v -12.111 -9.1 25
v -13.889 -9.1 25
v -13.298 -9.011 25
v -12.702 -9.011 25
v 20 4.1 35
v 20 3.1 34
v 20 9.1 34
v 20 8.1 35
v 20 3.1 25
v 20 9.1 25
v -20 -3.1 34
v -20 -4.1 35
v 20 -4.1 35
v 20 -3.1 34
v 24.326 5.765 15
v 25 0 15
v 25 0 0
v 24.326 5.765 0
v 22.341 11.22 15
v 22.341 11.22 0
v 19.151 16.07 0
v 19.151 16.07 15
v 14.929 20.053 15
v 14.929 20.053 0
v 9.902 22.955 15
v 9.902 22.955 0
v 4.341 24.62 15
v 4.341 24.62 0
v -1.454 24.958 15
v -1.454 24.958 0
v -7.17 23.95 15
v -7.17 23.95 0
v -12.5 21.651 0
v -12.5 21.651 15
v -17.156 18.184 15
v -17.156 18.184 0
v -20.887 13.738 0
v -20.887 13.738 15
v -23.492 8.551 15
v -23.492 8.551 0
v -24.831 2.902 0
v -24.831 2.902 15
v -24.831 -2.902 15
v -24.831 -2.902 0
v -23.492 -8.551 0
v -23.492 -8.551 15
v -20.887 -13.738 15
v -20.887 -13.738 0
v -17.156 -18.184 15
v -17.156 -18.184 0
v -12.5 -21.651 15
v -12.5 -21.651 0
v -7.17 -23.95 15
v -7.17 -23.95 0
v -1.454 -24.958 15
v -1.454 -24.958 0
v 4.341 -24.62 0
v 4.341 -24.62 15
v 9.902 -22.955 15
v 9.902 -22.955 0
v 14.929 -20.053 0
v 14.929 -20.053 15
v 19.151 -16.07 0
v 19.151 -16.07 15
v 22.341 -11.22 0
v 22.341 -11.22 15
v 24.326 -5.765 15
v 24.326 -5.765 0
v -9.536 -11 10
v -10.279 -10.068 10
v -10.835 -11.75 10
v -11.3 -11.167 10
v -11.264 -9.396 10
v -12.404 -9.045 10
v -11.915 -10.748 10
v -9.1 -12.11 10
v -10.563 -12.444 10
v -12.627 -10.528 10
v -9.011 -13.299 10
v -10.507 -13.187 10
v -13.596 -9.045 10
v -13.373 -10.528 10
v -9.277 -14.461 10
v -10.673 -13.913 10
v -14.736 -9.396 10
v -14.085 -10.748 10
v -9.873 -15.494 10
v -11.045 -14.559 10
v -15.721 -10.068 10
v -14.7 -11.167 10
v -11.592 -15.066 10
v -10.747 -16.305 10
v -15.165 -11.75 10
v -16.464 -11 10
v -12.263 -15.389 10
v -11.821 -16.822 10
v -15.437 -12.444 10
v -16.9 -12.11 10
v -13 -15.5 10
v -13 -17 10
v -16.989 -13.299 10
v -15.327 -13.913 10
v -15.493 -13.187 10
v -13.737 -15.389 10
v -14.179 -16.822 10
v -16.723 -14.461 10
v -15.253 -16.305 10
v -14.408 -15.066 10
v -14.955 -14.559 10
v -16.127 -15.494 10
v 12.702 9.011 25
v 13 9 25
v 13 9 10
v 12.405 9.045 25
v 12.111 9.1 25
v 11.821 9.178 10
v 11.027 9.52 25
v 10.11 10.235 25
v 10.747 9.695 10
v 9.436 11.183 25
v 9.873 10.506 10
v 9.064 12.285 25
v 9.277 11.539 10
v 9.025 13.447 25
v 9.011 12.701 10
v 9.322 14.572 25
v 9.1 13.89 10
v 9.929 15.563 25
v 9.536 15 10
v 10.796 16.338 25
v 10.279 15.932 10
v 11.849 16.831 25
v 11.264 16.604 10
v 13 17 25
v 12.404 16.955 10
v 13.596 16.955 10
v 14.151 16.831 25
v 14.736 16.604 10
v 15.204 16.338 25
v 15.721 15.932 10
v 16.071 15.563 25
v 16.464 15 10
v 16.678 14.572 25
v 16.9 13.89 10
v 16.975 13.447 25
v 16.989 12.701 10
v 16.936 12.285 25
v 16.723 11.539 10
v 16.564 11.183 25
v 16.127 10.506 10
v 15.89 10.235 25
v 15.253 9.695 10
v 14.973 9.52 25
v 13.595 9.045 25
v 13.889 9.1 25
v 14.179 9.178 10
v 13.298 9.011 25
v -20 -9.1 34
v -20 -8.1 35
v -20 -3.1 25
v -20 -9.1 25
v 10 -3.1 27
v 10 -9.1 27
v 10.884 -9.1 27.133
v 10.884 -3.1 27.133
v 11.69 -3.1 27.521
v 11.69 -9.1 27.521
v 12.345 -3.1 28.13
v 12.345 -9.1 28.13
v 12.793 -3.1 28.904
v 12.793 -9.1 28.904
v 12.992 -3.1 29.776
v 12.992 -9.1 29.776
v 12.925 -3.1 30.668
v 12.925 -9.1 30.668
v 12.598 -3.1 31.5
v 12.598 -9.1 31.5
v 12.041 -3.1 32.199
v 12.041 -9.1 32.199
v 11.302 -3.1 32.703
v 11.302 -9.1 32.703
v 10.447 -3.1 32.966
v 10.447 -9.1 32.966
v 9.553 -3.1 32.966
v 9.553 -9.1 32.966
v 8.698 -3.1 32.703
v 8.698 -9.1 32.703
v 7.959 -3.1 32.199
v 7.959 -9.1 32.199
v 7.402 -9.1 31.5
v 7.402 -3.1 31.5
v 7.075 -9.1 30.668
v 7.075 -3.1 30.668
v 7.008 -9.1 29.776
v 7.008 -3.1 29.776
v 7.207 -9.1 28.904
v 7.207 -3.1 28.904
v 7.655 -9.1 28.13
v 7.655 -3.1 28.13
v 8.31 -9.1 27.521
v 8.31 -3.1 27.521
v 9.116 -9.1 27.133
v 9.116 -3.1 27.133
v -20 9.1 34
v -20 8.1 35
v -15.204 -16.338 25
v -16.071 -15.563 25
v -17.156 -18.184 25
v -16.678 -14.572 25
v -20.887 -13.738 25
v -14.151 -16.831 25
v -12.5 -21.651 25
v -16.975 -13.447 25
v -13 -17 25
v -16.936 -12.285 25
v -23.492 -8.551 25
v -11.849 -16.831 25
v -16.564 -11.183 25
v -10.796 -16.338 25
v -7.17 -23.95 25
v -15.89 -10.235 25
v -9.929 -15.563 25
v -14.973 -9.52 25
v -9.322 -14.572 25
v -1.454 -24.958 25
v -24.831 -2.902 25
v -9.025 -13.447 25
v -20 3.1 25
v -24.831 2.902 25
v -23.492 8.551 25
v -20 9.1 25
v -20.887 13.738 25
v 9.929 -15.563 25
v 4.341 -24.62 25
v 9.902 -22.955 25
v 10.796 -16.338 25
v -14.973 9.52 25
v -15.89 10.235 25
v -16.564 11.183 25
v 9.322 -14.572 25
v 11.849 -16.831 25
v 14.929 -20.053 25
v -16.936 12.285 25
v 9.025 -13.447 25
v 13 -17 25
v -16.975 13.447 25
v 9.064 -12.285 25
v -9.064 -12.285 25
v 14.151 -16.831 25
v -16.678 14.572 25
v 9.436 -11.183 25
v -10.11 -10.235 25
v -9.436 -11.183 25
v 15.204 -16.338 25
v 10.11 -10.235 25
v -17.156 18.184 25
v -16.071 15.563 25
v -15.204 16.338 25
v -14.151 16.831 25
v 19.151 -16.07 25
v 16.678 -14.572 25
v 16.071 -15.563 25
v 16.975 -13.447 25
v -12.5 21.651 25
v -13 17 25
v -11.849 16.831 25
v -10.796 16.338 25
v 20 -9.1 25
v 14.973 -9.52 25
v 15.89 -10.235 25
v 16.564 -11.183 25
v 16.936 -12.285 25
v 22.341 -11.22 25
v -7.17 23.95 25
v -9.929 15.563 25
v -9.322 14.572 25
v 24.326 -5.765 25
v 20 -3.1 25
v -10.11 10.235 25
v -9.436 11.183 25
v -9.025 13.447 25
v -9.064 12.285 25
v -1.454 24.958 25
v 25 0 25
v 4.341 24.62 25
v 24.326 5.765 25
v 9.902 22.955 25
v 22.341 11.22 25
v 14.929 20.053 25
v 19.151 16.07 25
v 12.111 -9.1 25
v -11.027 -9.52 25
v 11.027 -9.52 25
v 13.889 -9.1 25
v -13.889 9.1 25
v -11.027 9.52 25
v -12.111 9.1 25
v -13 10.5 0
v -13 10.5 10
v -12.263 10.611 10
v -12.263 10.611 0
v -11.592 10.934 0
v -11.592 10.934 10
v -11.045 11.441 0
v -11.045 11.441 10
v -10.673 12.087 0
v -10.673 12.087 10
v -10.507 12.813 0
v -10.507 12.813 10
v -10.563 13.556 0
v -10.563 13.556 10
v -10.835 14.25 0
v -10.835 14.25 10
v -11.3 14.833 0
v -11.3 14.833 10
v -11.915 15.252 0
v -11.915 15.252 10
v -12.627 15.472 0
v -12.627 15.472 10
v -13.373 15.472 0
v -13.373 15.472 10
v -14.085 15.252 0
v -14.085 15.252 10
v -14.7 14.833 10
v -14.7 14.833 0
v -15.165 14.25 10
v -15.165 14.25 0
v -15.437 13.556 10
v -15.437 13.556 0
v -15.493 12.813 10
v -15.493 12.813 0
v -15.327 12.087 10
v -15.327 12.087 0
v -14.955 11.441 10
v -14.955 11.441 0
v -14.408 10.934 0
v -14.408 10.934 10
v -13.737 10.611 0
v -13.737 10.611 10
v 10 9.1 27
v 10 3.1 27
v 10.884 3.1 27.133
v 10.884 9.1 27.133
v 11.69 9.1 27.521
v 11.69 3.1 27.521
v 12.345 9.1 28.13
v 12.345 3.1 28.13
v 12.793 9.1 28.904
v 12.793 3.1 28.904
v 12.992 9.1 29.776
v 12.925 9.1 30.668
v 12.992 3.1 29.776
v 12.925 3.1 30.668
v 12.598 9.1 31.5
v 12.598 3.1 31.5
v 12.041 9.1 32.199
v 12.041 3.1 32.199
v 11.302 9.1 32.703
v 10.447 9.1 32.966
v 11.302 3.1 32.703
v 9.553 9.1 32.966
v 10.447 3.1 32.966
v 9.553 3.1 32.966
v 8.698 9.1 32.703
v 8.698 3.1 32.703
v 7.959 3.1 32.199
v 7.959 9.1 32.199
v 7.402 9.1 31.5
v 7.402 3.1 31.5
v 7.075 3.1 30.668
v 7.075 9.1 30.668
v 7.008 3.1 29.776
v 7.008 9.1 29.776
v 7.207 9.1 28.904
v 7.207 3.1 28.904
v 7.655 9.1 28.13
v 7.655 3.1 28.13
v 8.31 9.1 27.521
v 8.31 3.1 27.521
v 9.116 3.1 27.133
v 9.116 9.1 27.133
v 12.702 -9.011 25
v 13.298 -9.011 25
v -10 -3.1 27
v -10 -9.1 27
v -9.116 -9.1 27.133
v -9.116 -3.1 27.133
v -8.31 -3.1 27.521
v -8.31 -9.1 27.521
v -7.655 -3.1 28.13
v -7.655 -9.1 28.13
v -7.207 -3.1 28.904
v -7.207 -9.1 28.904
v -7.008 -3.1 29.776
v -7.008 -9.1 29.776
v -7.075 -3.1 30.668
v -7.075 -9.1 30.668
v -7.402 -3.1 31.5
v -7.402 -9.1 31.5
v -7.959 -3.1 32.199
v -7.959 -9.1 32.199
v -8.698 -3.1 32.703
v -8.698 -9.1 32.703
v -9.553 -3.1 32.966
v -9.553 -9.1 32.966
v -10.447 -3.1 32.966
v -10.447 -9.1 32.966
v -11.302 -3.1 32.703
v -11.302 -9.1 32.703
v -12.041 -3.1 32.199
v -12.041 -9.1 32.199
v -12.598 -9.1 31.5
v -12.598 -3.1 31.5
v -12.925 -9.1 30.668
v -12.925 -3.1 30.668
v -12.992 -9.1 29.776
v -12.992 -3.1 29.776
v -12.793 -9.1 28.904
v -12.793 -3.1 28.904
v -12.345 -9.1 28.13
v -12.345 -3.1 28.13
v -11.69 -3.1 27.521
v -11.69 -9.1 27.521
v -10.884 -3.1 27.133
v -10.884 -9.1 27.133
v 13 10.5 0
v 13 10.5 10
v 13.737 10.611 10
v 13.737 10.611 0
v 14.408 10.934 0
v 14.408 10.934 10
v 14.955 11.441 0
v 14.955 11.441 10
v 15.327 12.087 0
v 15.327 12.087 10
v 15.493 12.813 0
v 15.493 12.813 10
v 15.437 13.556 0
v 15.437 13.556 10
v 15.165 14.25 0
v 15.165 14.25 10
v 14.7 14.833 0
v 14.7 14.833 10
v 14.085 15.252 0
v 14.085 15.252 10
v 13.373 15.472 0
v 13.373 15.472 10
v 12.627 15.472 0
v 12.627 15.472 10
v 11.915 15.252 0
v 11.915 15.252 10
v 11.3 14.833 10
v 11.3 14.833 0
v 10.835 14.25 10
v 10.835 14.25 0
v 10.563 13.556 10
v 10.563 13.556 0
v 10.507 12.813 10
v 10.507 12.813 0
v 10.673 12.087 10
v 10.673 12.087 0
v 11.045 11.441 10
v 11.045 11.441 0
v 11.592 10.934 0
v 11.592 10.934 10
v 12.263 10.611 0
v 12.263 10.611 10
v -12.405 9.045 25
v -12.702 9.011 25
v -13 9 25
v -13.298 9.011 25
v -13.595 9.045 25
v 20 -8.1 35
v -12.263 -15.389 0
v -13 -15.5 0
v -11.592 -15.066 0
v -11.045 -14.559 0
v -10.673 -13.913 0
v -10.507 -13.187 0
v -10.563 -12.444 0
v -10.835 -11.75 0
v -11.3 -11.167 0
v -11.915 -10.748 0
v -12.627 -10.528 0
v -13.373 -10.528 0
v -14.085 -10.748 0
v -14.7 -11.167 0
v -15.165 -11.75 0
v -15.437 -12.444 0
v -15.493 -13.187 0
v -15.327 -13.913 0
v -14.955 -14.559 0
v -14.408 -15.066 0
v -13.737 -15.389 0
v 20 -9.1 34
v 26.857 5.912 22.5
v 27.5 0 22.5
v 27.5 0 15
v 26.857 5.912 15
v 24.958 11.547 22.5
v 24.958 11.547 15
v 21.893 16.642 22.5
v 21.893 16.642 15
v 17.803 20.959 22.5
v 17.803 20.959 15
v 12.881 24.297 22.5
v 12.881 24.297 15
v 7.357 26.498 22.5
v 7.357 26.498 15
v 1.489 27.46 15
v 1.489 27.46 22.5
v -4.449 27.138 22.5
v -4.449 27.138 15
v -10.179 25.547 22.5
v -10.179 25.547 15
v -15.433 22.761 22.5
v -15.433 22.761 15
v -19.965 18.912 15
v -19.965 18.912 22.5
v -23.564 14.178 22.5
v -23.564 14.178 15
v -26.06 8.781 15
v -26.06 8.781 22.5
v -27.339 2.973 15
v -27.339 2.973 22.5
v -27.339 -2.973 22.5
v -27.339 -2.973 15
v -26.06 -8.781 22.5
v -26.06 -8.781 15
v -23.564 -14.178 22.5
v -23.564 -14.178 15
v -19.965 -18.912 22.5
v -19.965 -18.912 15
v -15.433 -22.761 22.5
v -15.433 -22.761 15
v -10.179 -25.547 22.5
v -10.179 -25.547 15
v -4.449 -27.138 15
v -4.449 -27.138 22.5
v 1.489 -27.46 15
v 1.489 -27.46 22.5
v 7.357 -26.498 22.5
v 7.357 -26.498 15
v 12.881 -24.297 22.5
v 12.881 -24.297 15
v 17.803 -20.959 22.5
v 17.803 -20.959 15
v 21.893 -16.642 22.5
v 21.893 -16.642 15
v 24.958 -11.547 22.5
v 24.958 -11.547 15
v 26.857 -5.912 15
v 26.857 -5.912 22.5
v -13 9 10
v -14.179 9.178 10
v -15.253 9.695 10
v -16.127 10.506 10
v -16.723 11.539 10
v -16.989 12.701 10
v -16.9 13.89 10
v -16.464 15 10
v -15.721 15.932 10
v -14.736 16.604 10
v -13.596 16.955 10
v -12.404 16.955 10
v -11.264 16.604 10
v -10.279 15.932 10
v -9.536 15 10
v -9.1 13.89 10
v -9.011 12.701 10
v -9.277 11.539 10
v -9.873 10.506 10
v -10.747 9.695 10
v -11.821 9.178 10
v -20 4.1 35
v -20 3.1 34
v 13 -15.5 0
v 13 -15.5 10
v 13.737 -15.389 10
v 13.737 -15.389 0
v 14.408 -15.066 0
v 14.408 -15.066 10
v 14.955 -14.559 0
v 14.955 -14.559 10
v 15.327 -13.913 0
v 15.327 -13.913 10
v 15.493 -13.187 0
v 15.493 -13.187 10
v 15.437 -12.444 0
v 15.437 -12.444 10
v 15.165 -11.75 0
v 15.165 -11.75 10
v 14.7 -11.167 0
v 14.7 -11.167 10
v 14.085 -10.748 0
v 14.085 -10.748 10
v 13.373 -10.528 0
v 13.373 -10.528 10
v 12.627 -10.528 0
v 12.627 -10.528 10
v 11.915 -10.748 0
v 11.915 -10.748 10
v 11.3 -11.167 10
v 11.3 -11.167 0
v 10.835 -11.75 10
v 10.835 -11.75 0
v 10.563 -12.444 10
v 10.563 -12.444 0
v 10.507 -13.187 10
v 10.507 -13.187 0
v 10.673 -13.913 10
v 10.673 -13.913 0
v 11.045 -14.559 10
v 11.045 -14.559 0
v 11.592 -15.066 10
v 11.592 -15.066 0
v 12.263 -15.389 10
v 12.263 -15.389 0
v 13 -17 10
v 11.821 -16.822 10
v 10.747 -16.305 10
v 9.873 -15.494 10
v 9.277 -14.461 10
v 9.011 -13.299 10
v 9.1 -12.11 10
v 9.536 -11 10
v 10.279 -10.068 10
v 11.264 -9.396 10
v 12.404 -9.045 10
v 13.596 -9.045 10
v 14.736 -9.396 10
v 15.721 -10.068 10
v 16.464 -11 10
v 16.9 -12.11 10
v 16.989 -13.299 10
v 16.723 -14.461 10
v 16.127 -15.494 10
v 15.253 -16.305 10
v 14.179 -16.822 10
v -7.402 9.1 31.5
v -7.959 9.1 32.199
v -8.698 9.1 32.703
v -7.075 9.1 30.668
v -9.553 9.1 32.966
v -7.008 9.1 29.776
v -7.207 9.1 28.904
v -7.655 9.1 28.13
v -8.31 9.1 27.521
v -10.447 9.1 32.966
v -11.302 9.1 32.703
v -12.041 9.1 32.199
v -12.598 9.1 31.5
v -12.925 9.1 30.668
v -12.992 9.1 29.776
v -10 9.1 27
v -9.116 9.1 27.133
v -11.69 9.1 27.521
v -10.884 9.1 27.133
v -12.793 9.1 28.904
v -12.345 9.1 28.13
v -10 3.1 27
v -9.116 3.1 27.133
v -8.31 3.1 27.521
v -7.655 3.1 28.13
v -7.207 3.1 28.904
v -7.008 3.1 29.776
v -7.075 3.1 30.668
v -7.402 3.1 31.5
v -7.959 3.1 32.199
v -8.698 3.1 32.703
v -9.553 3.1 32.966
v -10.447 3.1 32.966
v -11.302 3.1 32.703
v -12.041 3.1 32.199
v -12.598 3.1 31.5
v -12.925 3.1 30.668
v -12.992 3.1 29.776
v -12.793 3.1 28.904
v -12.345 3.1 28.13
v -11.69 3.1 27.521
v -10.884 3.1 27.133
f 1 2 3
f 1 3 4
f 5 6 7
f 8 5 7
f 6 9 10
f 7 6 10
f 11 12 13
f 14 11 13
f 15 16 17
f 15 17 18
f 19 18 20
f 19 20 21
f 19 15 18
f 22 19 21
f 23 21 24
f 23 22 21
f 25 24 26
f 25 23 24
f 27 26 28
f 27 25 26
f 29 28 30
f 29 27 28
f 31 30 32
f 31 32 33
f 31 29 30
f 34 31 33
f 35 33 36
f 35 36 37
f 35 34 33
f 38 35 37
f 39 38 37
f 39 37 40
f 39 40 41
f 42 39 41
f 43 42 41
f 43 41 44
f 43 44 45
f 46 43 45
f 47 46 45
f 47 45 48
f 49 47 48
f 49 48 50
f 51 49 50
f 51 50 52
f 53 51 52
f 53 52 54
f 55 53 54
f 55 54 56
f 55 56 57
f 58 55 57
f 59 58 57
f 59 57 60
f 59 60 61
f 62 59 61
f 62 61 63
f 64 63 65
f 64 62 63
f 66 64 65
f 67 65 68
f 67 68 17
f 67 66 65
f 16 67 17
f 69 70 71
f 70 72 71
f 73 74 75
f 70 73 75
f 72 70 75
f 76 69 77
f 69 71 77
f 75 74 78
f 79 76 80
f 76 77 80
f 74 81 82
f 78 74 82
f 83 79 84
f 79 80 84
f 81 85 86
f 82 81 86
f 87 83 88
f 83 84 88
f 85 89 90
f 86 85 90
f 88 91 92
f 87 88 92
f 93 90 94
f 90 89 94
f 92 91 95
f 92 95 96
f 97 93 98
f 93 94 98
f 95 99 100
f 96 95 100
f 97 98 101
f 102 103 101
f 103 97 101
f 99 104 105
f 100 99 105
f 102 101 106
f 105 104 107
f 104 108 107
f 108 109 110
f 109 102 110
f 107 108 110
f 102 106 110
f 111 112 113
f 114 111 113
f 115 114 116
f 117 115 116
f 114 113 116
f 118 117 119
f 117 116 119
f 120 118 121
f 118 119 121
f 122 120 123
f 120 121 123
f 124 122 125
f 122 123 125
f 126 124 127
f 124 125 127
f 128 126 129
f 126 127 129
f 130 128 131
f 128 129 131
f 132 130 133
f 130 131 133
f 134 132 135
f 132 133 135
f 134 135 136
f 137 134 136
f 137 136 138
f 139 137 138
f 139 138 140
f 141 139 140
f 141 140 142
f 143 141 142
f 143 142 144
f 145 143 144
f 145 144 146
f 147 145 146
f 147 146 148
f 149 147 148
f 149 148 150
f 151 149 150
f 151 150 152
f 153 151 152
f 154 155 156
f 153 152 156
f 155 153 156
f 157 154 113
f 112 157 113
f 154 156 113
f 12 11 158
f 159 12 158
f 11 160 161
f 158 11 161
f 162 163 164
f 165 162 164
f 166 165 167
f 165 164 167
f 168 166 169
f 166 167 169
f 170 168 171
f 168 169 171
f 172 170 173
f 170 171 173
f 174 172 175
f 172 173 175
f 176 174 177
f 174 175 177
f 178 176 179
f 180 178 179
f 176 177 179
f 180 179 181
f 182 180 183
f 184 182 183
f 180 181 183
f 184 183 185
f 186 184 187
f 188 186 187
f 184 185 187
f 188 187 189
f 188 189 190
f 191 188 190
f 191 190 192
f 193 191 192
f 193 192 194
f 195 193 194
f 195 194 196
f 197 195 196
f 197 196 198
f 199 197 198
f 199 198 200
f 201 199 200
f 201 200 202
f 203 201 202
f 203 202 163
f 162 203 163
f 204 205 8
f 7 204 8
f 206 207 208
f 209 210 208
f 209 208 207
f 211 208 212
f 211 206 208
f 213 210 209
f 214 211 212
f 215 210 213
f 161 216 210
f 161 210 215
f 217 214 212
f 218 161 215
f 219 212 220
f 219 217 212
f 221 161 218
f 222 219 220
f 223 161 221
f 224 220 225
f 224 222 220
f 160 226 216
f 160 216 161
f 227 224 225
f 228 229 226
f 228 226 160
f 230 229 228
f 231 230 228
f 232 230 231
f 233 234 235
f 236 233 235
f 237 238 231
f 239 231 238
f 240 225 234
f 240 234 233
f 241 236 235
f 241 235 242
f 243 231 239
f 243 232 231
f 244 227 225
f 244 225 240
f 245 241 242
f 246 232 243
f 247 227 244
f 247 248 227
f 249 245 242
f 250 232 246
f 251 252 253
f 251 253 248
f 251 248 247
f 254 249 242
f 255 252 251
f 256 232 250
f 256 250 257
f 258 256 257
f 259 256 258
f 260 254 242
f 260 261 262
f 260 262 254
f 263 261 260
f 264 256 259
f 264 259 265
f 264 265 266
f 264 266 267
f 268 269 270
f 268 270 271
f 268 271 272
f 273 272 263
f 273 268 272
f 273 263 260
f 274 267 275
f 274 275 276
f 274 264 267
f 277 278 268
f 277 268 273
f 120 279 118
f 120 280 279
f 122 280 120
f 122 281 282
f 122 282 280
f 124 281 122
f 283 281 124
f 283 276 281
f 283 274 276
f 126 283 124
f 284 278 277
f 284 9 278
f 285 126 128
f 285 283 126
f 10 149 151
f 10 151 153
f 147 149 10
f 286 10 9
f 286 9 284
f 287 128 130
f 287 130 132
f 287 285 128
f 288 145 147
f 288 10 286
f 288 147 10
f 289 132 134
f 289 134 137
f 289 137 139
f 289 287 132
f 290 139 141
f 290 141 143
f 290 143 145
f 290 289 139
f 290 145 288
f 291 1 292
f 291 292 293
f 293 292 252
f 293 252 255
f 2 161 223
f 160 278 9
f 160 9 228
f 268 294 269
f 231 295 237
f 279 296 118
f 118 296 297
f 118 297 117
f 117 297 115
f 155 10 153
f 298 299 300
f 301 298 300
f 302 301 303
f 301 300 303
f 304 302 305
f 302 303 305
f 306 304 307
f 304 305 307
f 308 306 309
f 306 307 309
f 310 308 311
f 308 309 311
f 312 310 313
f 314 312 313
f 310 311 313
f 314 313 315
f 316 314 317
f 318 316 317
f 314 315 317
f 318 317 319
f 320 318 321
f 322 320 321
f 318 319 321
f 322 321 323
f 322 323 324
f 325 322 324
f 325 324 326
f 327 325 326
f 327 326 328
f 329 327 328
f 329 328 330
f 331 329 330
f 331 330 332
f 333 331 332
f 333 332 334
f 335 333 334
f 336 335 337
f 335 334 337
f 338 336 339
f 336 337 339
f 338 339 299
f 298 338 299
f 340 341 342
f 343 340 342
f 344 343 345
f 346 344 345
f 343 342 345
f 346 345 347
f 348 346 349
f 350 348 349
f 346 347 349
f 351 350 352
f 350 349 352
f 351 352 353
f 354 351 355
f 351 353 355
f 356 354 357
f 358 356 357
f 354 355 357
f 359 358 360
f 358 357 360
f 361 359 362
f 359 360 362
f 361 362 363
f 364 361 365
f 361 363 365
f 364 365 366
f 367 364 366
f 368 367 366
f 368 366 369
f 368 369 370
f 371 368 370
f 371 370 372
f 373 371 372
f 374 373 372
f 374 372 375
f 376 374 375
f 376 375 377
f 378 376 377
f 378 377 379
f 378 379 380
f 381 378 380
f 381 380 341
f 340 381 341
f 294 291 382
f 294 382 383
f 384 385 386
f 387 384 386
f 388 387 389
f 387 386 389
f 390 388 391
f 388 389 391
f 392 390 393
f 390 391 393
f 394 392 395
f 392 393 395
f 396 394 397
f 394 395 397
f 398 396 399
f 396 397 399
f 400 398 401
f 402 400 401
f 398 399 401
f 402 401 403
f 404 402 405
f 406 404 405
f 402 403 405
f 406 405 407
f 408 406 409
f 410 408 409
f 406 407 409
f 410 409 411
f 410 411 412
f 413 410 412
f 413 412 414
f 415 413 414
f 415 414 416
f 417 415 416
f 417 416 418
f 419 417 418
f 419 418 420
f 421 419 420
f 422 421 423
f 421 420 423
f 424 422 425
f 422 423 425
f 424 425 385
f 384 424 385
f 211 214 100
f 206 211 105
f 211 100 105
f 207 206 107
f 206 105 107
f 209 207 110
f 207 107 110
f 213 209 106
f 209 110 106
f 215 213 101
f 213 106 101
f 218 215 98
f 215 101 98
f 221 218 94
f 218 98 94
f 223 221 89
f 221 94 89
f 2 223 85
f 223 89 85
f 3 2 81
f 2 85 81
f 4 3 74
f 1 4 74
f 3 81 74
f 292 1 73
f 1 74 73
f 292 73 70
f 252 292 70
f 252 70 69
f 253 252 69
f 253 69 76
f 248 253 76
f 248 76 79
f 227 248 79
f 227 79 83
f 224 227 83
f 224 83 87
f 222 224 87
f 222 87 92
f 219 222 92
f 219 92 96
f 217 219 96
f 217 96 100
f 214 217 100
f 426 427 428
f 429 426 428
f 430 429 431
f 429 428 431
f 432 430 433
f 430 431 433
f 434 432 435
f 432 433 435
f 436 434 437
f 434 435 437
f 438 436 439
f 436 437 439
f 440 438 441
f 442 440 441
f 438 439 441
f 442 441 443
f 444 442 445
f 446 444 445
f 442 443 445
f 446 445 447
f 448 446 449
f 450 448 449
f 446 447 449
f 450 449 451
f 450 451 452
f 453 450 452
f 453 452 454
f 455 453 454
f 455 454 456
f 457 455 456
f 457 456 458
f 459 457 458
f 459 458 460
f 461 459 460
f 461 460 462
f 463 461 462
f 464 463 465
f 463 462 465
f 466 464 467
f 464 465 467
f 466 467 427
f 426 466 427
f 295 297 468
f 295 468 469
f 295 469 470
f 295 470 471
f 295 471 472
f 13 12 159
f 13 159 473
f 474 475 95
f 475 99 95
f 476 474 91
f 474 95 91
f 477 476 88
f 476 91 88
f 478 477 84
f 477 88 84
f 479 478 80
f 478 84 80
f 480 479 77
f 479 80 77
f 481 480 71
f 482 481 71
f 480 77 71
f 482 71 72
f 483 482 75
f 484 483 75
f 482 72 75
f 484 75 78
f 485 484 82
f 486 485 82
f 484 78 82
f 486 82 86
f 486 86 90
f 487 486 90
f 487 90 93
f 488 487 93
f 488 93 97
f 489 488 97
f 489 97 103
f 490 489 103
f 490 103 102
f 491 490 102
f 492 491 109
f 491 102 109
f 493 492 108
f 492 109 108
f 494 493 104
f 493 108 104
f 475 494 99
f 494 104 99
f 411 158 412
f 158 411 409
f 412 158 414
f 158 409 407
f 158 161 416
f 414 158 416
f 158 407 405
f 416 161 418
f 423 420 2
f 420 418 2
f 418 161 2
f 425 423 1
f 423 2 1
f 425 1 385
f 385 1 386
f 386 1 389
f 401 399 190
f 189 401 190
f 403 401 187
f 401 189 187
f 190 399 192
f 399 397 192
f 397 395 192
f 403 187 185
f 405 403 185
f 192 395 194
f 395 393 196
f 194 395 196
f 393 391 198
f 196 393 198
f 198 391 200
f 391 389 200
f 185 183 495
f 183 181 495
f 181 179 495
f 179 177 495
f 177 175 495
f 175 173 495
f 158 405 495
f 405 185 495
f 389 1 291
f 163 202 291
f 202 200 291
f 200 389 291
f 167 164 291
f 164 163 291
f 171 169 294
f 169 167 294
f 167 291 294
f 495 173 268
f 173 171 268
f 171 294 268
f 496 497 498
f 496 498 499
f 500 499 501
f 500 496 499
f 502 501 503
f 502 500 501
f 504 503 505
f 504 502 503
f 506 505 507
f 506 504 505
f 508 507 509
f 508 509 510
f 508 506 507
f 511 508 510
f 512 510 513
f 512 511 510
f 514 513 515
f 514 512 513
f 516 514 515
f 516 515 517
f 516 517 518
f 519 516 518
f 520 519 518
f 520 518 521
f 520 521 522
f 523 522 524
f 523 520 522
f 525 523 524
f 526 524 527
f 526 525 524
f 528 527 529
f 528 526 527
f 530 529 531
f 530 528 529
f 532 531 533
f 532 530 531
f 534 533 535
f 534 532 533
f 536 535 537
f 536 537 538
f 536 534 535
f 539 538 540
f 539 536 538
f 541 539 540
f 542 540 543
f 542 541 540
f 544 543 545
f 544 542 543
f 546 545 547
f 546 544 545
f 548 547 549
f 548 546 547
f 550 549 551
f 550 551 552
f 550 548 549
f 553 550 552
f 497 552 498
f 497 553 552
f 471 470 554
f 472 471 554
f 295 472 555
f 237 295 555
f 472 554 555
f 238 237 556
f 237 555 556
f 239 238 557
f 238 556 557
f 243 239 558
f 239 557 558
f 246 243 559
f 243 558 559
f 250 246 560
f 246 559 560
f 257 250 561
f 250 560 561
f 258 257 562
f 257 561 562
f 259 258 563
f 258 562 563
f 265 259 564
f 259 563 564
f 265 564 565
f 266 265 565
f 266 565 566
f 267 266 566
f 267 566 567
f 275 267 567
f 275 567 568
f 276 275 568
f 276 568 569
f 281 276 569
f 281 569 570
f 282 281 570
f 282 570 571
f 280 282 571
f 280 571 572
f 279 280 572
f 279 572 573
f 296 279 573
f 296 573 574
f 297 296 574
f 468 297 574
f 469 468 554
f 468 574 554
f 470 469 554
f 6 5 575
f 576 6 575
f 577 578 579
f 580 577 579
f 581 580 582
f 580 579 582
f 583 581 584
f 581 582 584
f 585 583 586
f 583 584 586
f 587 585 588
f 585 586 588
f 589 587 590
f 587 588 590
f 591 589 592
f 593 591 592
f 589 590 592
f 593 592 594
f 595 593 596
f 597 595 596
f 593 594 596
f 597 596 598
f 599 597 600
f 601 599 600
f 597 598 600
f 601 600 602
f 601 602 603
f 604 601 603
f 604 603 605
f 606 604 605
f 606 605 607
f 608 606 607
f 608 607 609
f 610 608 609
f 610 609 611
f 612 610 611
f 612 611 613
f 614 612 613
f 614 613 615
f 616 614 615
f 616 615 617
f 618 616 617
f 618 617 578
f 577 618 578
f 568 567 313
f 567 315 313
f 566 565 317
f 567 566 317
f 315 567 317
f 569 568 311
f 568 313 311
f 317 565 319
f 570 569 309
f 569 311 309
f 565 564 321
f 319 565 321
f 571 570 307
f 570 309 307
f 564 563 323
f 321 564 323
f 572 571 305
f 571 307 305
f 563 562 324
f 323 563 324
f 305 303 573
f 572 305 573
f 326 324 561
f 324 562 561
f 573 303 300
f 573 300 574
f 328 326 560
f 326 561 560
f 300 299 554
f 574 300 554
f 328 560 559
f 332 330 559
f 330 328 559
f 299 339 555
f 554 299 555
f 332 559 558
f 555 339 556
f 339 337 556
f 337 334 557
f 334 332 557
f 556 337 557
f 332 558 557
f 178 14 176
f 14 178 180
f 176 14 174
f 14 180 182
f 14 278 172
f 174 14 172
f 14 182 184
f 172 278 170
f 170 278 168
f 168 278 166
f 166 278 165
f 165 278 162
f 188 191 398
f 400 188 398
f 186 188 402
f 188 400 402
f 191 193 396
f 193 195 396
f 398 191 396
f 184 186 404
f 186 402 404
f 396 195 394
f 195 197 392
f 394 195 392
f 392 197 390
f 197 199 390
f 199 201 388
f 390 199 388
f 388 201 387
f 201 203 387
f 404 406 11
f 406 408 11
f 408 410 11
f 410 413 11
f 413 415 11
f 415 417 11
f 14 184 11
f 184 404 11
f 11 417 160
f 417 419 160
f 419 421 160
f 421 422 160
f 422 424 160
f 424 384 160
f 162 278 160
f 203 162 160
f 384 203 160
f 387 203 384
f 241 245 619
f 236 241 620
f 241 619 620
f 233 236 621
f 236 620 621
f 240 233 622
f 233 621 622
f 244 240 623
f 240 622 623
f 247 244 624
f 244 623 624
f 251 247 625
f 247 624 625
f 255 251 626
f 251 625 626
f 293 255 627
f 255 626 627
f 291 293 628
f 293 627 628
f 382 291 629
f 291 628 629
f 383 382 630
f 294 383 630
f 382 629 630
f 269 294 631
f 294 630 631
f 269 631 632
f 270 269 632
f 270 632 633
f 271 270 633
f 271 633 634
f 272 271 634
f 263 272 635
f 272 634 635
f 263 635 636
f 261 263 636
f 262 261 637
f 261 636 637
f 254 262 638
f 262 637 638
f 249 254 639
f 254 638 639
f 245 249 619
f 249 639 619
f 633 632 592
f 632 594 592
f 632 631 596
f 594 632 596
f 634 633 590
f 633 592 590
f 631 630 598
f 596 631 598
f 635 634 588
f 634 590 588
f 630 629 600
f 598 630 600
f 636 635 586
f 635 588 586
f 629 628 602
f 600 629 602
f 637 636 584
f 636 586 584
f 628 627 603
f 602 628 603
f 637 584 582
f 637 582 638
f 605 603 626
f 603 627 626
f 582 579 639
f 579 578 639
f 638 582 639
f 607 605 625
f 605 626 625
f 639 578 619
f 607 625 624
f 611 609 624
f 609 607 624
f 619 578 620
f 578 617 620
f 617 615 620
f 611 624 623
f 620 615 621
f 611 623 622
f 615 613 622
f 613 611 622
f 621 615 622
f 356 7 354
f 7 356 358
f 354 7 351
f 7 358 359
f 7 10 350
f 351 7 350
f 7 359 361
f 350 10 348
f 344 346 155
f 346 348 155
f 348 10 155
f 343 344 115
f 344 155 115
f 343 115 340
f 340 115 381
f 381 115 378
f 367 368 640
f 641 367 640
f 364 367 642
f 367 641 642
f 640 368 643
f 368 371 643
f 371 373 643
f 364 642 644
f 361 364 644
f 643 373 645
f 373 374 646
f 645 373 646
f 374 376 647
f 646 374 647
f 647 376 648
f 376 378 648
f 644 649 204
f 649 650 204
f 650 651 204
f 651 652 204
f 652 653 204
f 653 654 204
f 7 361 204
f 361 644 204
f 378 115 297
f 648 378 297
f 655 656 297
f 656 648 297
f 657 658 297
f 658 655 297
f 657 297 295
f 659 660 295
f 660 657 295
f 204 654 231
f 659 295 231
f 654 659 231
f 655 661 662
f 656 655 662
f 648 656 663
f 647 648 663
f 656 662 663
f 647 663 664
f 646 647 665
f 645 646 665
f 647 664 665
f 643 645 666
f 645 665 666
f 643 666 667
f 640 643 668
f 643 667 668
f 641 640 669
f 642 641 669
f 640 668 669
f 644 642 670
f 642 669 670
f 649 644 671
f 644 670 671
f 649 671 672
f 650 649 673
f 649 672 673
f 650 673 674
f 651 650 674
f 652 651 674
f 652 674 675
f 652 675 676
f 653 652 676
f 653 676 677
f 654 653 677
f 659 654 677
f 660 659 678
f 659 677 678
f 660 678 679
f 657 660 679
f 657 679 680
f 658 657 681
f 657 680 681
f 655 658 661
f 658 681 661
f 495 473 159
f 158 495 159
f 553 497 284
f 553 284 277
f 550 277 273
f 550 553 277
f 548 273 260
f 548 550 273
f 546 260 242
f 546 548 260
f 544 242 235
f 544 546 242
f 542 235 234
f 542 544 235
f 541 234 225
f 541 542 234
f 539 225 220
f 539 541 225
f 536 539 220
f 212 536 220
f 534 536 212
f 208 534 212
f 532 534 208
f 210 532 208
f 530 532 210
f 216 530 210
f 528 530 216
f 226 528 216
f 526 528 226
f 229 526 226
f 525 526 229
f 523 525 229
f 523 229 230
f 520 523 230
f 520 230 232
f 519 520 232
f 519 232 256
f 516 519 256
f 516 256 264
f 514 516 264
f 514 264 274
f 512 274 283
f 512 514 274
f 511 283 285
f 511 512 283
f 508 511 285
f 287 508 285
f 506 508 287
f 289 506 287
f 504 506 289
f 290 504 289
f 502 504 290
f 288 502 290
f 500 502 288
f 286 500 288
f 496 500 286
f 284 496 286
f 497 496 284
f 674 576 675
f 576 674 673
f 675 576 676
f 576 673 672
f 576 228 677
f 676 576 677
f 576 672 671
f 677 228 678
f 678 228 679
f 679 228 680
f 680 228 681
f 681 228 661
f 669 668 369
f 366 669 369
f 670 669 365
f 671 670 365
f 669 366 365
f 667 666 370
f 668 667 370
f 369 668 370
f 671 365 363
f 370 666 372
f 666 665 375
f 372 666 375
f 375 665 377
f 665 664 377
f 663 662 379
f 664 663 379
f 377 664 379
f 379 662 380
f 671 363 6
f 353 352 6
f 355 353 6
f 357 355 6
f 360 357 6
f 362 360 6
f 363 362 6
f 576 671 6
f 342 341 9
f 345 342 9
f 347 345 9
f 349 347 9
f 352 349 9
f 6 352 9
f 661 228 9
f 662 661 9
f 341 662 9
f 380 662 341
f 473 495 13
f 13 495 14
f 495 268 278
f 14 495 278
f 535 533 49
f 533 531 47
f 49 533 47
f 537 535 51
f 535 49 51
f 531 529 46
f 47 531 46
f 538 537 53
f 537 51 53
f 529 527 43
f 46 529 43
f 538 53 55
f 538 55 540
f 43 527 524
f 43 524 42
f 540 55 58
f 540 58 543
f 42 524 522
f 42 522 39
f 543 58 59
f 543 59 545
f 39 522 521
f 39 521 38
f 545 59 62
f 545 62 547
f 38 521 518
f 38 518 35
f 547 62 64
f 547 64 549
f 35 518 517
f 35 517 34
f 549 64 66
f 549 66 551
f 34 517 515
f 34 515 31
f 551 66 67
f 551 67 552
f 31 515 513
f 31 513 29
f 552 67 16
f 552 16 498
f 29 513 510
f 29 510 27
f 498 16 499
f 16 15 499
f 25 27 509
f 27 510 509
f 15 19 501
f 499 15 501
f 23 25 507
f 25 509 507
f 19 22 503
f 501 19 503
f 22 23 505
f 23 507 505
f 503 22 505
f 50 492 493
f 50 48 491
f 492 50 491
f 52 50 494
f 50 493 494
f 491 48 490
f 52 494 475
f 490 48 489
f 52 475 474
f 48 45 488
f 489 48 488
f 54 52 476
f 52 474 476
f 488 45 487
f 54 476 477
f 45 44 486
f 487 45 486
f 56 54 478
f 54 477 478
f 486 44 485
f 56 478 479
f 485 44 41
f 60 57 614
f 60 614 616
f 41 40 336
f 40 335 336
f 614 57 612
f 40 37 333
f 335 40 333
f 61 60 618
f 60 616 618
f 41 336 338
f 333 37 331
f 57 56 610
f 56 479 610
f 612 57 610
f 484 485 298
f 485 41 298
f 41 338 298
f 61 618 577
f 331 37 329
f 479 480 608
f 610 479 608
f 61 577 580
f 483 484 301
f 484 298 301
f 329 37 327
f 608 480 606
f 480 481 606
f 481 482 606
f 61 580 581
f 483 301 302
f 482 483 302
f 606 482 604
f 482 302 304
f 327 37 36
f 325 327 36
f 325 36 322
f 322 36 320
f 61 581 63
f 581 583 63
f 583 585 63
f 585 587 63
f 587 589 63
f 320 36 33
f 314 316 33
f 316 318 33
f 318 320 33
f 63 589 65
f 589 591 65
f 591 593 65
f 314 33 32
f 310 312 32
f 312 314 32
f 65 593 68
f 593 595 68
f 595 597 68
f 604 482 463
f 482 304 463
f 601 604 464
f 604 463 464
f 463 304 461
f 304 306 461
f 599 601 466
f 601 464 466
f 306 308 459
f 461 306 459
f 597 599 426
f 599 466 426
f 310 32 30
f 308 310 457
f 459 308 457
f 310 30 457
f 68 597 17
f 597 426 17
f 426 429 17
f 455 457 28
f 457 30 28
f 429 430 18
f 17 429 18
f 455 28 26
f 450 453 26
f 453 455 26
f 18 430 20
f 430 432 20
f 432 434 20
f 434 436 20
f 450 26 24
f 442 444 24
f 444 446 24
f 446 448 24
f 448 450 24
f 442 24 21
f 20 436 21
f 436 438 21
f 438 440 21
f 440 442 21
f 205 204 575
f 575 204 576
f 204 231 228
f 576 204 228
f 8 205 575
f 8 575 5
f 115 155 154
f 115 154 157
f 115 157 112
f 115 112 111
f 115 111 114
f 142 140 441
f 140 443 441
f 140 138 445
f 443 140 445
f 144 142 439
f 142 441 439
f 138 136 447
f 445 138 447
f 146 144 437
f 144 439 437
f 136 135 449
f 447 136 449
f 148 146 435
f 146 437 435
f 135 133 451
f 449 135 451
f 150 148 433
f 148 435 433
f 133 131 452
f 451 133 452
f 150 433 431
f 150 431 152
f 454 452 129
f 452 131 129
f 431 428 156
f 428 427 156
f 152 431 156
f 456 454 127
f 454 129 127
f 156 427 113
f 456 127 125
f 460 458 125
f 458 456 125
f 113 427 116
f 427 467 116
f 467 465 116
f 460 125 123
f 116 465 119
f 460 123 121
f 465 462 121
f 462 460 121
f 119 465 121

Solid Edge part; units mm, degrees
sketch "Sketch1" plane through (0, 0, 0) normal (0, -1, 0) x (1, 0, 0)
  line L0 (0, 0) -> (25, 0)
  line L1 (25, 0) -> (25, 15)
  line L2 (25, 15) -> (27.5, 15)
  line L3 (27.5, 15) -> (27.5, 25)
  line L4 (27.5, 25) -> (0, 25)
  dimension "D1" = 25
  dimension "D2" = 15
revolve "RevolvedProtrusion1" add sketch "Sketch1" angle 360 about axis through (0, 0, 0) along (0, 0, 1)
chamfer "Chamfer1" distance 2.5 angle 45 1 edges at (-27.5, 0, 25)
sketch "Sketch2" plane through (0, 0, 25) normal (0, 0, 1) x (1, 0, 0)
  line L0 (-20, 3.1) -> (20, 3.1)
  line L1 (20, 3.1) -> (20, 9.1)
  line L2 (20, 9.1) -> (-20, 9.1)
  line L3 (-20, 9.1) -> (-20, 3.1)
  line L4 (-20, -9.1) -> (20, -9.1)
  line L5 (20, -9.1) -> (20, -3.1)
  line L6 (20, -3.1) -> (-20, -3.1)
  line L7 (-20, -3.1) -> (-20, -9.1)
  dimension "D1" = 6.2
  dimension "D2" = 6
  dimension "D3" = 40
extrude "ExtrudedProtrusion_1" add sketch "Sketch2" along normal blind 10
hole "Hole_1" at (-10, -9.1, 30) direction (0, 1, 0) diameter 6 end through all
hole "Hole1" at (10, -9.1, 30) direction (0, 1, 0) diameter 6 end through all
chamfer "Chamfer_2" distance 1 angle 45 4 edges at (0, -3.1, 35) (0, -9.1, 35) (0, 3.1, 35) (0, 9.1, 35)
hole "Hole_3" at (-13, -13, 25) direction (0, 0, -1) diameter 5 end up to next counterbore diameter 8 counterbore depth 15
hole "Hole2" at (-13, 13, 25) direction (0, 0, -1) diameter 5 end up to next counterbore diameter 8 counterbore depth 15
hole "Hole3" at (13, -13, 25) direction (0, 0, -1) diameter 5 end up to next counterbore diameter 8 counterbore depth 15
hole "Hole4" at (13, 13, 25) direction (0, 0, -1) diameter 5 end up to next counterbore diameter 8 counterbore depth 15
properties material "Polyethylene, low density"
